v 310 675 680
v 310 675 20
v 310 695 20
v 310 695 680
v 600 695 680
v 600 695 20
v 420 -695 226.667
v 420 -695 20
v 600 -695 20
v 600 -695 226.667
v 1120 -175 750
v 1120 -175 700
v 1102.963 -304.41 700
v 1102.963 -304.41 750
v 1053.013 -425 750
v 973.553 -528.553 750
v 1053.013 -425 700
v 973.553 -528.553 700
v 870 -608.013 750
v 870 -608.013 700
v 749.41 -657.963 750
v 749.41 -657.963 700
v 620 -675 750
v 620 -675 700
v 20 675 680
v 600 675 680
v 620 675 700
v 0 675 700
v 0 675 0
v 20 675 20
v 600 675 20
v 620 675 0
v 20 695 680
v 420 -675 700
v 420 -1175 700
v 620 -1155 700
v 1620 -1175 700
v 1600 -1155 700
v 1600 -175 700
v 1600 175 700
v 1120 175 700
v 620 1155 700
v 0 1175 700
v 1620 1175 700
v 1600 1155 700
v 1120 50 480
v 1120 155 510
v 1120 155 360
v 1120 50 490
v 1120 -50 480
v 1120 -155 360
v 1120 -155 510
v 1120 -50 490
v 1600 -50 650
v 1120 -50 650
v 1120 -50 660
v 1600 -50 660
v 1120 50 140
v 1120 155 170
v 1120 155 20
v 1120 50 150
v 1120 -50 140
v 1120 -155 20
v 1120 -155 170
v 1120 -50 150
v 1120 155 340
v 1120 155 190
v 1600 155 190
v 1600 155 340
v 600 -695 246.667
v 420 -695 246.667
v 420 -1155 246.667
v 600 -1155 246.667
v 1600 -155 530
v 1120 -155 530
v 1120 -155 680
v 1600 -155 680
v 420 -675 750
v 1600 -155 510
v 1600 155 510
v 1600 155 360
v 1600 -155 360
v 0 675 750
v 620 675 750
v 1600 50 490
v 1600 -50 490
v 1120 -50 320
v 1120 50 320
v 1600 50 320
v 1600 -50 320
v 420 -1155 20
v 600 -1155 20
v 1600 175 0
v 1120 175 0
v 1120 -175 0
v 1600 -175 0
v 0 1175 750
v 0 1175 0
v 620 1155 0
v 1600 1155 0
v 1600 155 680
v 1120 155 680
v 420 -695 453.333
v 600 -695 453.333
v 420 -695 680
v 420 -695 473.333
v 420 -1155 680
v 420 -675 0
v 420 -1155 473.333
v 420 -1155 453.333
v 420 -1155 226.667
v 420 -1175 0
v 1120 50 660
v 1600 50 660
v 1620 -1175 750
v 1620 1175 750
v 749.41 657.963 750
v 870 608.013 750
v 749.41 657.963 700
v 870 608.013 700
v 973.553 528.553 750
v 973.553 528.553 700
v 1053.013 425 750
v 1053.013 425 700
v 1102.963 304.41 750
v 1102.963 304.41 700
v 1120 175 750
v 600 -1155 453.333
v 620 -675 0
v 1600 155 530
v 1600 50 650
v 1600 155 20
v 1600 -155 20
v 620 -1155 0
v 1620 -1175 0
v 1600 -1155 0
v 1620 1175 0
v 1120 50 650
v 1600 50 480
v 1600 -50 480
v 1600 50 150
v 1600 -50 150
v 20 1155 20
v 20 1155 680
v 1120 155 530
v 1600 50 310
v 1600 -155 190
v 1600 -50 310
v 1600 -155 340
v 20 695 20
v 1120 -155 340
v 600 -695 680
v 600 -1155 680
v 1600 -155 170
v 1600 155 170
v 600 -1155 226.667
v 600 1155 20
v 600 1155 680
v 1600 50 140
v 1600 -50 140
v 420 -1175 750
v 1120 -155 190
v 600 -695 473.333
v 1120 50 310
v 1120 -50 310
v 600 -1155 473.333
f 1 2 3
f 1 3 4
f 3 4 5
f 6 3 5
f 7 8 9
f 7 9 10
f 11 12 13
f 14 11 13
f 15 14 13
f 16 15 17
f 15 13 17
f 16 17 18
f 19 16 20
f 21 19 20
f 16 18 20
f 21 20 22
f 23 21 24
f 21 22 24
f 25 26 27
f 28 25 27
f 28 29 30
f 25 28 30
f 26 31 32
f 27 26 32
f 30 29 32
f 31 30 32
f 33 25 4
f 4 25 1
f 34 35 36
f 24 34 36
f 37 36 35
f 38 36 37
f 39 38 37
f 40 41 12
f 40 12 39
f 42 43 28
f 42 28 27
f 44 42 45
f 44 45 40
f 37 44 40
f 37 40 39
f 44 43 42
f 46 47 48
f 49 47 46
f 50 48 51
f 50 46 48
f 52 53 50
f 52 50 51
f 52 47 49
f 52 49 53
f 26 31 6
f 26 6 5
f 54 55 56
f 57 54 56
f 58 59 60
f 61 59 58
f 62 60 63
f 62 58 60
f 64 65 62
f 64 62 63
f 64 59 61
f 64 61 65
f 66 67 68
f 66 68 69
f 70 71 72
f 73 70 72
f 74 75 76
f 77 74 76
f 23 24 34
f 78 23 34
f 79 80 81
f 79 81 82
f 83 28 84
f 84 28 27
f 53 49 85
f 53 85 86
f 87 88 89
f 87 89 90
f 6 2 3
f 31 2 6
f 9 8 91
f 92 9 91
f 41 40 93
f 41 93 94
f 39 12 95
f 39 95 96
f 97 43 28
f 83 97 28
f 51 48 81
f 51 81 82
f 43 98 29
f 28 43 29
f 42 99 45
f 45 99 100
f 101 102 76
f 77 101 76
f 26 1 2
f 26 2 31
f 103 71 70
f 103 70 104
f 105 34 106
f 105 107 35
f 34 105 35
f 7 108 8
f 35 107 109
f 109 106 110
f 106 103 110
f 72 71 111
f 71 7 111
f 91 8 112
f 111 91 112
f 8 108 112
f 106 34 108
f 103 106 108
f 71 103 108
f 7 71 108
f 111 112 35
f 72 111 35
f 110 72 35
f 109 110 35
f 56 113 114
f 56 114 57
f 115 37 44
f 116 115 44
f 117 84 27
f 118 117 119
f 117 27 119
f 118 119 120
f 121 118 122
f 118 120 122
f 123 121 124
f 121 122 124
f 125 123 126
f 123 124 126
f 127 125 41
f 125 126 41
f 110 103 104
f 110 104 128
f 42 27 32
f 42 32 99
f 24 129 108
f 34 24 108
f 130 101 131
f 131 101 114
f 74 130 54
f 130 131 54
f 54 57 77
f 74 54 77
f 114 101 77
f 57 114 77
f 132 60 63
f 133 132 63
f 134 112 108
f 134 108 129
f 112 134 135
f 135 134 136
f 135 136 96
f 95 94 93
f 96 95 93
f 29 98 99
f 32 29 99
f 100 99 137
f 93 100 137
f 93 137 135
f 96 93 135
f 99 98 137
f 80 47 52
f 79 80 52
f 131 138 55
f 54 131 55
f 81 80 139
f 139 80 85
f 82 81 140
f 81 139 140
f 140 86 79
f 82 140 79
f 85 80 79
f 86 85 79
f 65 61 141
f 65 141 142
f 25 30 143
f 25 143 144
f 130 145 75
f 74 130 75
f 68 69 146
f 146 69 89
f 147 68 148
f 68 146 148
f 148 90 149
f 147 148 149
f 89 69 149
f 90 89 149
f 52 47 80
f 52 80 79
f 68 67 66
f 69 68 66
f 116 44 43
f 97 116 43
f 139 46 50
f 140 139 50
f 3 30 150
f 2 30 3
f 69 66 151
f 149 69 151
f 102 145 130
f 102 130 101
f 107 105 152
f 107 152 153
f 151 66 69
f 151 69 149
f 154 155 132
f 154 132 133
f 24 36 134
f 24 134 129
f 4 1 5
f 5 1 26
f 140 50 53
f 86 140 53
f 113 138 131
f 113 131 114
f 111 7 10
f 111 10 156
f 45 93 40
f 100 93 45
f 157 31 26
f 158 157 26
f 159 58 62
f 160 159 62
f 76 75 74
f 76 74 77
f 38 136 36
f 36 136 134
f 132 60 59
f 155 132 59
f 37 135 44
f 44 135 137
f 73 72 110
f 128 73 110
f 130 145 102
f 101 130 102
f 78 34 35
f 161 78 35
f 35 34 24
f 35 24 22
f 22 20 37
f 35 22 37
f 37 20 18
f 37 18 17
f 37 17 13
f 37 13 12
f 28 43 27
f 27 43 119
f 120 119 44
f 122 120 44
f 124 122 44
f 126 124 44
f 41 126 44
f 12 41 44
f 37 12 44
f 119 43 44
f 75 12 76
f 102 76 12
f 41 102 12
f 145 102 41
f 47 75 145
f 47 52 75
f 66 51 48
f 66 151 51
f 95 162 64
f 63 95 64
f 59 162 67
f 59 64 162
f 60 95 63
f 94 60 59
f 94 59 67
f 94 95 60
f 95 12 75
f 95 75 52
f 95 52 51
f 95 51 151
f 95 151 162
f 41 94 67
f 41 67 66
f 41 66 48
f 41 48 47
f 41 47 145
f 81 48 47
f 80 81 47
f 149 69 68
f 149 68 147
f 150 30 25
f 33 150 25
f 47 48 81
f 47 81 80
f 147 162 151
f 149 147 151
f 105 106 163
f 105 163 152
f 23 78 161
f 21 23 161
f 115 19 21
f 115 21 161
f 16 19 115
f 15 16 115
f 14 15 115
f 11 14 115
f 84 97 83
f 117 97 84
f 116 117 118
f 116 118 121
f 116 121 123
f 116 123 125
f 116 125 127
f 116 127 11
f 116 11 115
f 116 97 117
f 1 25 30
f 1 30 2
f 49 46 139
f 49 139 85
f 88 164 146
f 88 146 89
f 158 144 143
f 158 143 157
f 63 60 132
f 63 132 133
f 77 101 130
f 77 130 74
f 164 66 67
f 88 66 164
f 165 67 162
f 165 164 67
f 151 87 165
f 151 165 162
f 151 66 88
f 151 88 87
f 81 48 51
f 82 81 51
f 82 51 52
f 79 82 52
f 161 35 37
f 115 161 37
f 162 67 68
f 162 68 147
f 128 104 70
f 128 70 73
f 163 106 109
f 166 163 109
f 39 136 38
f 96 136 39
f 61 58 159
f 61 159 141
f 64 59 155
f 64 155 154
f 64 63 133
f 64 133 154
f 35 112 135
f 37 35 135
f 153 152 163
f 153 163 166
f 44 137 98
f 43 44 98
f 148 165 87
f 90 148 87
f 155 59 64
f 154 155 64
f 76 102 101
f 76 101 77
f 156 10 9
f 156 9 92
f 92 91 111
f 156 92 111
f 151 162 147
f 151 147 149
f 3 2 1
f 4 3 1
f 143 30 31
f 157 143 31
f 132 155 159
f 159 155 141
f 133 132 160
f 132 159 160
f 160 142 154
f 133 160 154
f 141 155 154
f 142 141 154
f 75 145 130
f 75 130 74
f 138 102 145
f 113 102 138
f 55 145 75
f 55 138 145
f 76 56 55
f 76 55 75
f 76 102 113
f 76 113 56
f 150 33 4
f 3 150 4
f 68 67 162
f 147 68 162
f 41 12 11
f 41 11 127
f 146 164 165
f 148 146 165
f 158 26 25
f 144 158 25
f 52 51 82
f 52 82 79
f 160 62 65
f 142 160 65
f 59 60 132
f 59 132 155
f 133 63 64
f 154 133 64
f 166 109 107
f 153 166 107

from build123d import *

# Parameters (mm, degrees)
F0_W      = 20
F0_H      = 980
F0_W_2    = 480
F0_H_2    = 350
F1_DEPTH  = 700
F2_START  = 700
F2_DEPTH  = 50
F3_W      = 310
F3_H      = 150
F4_DEPTH  = 480
F5_W      = 290
F5_H      = 660
F6_DEPTH  = 480
F7_W      = 460
F7_H      = 206.6666666667
F8_DEPTH  = 180
F9_DEPTH  = 480
F10_DEPTH = 20
F11_DEPTH = 20
F12_W     = 100
F12_H     = 10
F13_DEPTH = 480


with BuildPart() as f1:
    # F0 (on Top) → F1 (new body)
    with BuildSketch(Plane.XY):
        Polygon((1620, -1175), (1620, -1155), (1600, -1155), (620, -1155), (620, -1175), align=None)
        with Locations((1610, -665)):
            Rectangle(F0_W, F0_H)
        with Locations((1360, 0)):
            Rectangle(F0_W_2, F0_H_2)
        with Locations((1610, 0)):
            Rectangle(F0_W, F0_H_2)
        with Locations((1610, 665)):
            Rectangle(F0_W, F0_H)
        Polygon((620, 1175), (0, 1175), (0, 675), (620, 675), (620, 1155), align=None)
        Polygon((1620, 1175), (620, 1175), (620, 1155), (1600, 1155), (1620, 1155), align=None)
        Polygon((620, -1155), (620, -675), (420, -675), (420, -1175), (620, -1175), align=None)
    extrude(amount=F1_DEPTH)

    # F3 (on face) → F4 (cut, through all)
    with BuildSketch(Plane(origin=(1120, 0, 0), x_dir=(0, -1, 0), z_dir=(-1, 0, 0))):
        with Locations((0, 605)):
            Rectangle(F3_W, F3_H)
        with Locations((0, 435)):
            Rectangle(F3_W, F3_H)
        with Locations((0, 265)):
            Rectangle(F3_W, F3_H)
        with Locations((0, 95)):
            Rectangle(F3_W, F3_H)
    extrude(amount=-F4_DEPTH, mode=Mode.SUBTRACT)

    # F5 (on face) → F6 (cut, through all)
    with BuildSketch(Plane.XZ.offset(-675)):
        with Locations((165, 350)):
            Rectangle(F5_W, F5_H)
        with Locations((455, 350)):
            Rectangle(F5_W, F5_H)
    extrude(amount=-F6_DEPTH, mode=Mode.SUBTRACT)

    # F7 (on face) → F8 (cut, through all)
    with BuildSketch(Plane(origin=(420, 0, 0), x_dir=(0, -1, 0), z_dir=(-1, 0, 0))):
        with Locations((925, 576.6666666667)):
            Rectangle(F7_W, F7_H)
        with Locations((925, 350)):
            Rectangle(F7_W, F7_H)
        with Locations((925, 123.3333333333)):
            Rectangle(F7_W, F7_H)
    extrude(amount=-F8_DEPTH, mode=Mode.SUBTRACT)


with BuildPart() as f2:
    # F0 (on Top) → F2 (new body)
    with BuildSketch(Plane.XY.offset(F2_START)):
        Polygon((620, 1175), (0, 1175), (0, 675), (620, 675), (620, 1155), align=None)
        Polygon((1620, 1175), (620, 1175), (620, 1155), (1600, 1155), (1620, 1155), align=None)
        with BuildLine():
            Line((1600, 1155), (620, 1155))
            Line((620, 1155), (620, 675))
            ThreePointArc((620, 675), (973.5533905933, 528.5533905933), (1120, 175))
            Line((1120, 175), (1600, 175))
            Line((1600, 175), (1600, 1155))
        make_face()
        with Locations((1610, 665)):
            Rectangle(F0_W, F0_H)
        with Locations((1610, 0)):
            Rectangle(F0_W, F0_H_2)
        with Locations((1360, 0)):
            Rectangle(F0_W_2, F0_H_2)
        with Locations((1610, -665)):
            Rectangle(F0_W, F0_H)
        Polygon((1620, -1175), (1620, -1155), (1600, -1155), (620, -1155), (620, -1175), align=None)
        with BuildLine():
            Line((1600, -175), (1120, -175))
            ThreePointArc((1120, -175), (973.5533905933, -528.5533905933), (620, -675))
            Line((620, -675), (620, -1155))
            Line((620, -1155), (1600, -1155))
            Line((1600, -1155), (1600, -175))
        make_face()
        Polygon((620, -1155), (620, -675), (420, -675), (420, -1175), (620, -1175), align=None)
    extrude(amount=F2_DEPTH)


with BuildPart() as f9:
    # F3 (on face) → F9 (new body, through all)
    with BuildSketch(Plane(origin=(1120, 0, 0), x_dir=(0, -1, 0), z_dir=(-1, 0, 0))):
        with Locations((0, 605)):
            Rectangle(F3_W, F3_H)
    extrude(amount=-F9_DEPTH)


with BuildPart() as f9b:
    # F3 (on face) → F9, piece 2 (new body, through all)
    with BuildSketch(Plane(origin=(1120, 0, 0), x_dir=(0, -1, 0), z_dir=(-1, 0, 0))):
        with Locations((0, 435)):
            Rectangle(F3_W, F3_H)
    extrude(amount=-F9_DEPTH)


with BuildPart() as f9c:
    # F3 (on face) → F9, piece 3 (new body, through all)
    with BuildSketch(Plane(origin=(1120, 0, 0), x_dir=(0, -1, 0), z_dir=(-1, 0, 0))):
        with Locations((0, 265)):
            Rectangle(F3_W, F3_H)
    extrude(amount=-F9_DEPTH)


with BuildPart() as f9d:
    # F3 (on face) → F9, piece 4 (new body, through all)
    with BuildSketch(Plane(origin=(1120, 0, 0), x_dir=(0, -1, 0), z_dir=(-1, 0, 0))):
        with Locations((0, 95)):
            Rectangle(F3_W, F3_H)
    extrude(amount=-F9_DEPTH)


with BuildPart() as f10:
    # F5 (on face) → F10 (new body)
    with BuildSketch(Plane.XZ.offset(-675)):
        with Locations((165, 350)):
            Rectangle(F5_W, F5_H)
    extrude(amount=-F10_DEPTH)


with BuildPart() as f11:
    # F5 (on face) → F11 (new body)
    with BuildSketch(Plane.XZ.offset(-675)):
        with Locations((455, 350)):
            Rectangle(F5_W, F5_H)
    extrude(amount=-F11_DEPTH)


with BuildPart() as f13_tool:
    # F12 (on face) → F13 (new body, through all)
    with BuildSketch(Plane(origin=(1120, 0, 0), x_dir=(0, -1, 0), z_dir=(-1, 0, 0))):
        with Locations((0, 655)):
            Rectangle(F12_W, F12_H)
        with Locations((0, 485)):
            Rectangle(F12_W, F12_H)
        with Locations((0, 315)):
            Rectangle(F12_W, F12_H)
        with Locations((0, 145)):
            Rectangle(F12_W, F12_H)
    extrude(amount=-F13_DEPTH)


with BuildPart() as f9_1:
    add(f9.part)

    # F13: cut by f13_tool
    add(f13_tool.part, mode=Mode.SUBTRACT)


with BuildPart() as f9b_1:
    add(f9b.part)

    # F13: cut by f13_tool
    add(f13_tool.part, mode=Mode.SUBTRACT)


with BuildPart() as f9c_1:
    add(f9c.part)

    # F13: cut by f13_tool
    add(f13_tool.part, mode=Mode.SUBTRACT)


with BuildPart() as f9d_1:
    add(f9d.part)

    # F13: cut by f13_tool
    add(f13_tool.part, mode=Mode.SUBTRACT)


solid = Compound([f1.part, f2.part, f10.part, f11.part, f9_1.part, f9b_1.part, f9c_1.part, f9d_1.part])
